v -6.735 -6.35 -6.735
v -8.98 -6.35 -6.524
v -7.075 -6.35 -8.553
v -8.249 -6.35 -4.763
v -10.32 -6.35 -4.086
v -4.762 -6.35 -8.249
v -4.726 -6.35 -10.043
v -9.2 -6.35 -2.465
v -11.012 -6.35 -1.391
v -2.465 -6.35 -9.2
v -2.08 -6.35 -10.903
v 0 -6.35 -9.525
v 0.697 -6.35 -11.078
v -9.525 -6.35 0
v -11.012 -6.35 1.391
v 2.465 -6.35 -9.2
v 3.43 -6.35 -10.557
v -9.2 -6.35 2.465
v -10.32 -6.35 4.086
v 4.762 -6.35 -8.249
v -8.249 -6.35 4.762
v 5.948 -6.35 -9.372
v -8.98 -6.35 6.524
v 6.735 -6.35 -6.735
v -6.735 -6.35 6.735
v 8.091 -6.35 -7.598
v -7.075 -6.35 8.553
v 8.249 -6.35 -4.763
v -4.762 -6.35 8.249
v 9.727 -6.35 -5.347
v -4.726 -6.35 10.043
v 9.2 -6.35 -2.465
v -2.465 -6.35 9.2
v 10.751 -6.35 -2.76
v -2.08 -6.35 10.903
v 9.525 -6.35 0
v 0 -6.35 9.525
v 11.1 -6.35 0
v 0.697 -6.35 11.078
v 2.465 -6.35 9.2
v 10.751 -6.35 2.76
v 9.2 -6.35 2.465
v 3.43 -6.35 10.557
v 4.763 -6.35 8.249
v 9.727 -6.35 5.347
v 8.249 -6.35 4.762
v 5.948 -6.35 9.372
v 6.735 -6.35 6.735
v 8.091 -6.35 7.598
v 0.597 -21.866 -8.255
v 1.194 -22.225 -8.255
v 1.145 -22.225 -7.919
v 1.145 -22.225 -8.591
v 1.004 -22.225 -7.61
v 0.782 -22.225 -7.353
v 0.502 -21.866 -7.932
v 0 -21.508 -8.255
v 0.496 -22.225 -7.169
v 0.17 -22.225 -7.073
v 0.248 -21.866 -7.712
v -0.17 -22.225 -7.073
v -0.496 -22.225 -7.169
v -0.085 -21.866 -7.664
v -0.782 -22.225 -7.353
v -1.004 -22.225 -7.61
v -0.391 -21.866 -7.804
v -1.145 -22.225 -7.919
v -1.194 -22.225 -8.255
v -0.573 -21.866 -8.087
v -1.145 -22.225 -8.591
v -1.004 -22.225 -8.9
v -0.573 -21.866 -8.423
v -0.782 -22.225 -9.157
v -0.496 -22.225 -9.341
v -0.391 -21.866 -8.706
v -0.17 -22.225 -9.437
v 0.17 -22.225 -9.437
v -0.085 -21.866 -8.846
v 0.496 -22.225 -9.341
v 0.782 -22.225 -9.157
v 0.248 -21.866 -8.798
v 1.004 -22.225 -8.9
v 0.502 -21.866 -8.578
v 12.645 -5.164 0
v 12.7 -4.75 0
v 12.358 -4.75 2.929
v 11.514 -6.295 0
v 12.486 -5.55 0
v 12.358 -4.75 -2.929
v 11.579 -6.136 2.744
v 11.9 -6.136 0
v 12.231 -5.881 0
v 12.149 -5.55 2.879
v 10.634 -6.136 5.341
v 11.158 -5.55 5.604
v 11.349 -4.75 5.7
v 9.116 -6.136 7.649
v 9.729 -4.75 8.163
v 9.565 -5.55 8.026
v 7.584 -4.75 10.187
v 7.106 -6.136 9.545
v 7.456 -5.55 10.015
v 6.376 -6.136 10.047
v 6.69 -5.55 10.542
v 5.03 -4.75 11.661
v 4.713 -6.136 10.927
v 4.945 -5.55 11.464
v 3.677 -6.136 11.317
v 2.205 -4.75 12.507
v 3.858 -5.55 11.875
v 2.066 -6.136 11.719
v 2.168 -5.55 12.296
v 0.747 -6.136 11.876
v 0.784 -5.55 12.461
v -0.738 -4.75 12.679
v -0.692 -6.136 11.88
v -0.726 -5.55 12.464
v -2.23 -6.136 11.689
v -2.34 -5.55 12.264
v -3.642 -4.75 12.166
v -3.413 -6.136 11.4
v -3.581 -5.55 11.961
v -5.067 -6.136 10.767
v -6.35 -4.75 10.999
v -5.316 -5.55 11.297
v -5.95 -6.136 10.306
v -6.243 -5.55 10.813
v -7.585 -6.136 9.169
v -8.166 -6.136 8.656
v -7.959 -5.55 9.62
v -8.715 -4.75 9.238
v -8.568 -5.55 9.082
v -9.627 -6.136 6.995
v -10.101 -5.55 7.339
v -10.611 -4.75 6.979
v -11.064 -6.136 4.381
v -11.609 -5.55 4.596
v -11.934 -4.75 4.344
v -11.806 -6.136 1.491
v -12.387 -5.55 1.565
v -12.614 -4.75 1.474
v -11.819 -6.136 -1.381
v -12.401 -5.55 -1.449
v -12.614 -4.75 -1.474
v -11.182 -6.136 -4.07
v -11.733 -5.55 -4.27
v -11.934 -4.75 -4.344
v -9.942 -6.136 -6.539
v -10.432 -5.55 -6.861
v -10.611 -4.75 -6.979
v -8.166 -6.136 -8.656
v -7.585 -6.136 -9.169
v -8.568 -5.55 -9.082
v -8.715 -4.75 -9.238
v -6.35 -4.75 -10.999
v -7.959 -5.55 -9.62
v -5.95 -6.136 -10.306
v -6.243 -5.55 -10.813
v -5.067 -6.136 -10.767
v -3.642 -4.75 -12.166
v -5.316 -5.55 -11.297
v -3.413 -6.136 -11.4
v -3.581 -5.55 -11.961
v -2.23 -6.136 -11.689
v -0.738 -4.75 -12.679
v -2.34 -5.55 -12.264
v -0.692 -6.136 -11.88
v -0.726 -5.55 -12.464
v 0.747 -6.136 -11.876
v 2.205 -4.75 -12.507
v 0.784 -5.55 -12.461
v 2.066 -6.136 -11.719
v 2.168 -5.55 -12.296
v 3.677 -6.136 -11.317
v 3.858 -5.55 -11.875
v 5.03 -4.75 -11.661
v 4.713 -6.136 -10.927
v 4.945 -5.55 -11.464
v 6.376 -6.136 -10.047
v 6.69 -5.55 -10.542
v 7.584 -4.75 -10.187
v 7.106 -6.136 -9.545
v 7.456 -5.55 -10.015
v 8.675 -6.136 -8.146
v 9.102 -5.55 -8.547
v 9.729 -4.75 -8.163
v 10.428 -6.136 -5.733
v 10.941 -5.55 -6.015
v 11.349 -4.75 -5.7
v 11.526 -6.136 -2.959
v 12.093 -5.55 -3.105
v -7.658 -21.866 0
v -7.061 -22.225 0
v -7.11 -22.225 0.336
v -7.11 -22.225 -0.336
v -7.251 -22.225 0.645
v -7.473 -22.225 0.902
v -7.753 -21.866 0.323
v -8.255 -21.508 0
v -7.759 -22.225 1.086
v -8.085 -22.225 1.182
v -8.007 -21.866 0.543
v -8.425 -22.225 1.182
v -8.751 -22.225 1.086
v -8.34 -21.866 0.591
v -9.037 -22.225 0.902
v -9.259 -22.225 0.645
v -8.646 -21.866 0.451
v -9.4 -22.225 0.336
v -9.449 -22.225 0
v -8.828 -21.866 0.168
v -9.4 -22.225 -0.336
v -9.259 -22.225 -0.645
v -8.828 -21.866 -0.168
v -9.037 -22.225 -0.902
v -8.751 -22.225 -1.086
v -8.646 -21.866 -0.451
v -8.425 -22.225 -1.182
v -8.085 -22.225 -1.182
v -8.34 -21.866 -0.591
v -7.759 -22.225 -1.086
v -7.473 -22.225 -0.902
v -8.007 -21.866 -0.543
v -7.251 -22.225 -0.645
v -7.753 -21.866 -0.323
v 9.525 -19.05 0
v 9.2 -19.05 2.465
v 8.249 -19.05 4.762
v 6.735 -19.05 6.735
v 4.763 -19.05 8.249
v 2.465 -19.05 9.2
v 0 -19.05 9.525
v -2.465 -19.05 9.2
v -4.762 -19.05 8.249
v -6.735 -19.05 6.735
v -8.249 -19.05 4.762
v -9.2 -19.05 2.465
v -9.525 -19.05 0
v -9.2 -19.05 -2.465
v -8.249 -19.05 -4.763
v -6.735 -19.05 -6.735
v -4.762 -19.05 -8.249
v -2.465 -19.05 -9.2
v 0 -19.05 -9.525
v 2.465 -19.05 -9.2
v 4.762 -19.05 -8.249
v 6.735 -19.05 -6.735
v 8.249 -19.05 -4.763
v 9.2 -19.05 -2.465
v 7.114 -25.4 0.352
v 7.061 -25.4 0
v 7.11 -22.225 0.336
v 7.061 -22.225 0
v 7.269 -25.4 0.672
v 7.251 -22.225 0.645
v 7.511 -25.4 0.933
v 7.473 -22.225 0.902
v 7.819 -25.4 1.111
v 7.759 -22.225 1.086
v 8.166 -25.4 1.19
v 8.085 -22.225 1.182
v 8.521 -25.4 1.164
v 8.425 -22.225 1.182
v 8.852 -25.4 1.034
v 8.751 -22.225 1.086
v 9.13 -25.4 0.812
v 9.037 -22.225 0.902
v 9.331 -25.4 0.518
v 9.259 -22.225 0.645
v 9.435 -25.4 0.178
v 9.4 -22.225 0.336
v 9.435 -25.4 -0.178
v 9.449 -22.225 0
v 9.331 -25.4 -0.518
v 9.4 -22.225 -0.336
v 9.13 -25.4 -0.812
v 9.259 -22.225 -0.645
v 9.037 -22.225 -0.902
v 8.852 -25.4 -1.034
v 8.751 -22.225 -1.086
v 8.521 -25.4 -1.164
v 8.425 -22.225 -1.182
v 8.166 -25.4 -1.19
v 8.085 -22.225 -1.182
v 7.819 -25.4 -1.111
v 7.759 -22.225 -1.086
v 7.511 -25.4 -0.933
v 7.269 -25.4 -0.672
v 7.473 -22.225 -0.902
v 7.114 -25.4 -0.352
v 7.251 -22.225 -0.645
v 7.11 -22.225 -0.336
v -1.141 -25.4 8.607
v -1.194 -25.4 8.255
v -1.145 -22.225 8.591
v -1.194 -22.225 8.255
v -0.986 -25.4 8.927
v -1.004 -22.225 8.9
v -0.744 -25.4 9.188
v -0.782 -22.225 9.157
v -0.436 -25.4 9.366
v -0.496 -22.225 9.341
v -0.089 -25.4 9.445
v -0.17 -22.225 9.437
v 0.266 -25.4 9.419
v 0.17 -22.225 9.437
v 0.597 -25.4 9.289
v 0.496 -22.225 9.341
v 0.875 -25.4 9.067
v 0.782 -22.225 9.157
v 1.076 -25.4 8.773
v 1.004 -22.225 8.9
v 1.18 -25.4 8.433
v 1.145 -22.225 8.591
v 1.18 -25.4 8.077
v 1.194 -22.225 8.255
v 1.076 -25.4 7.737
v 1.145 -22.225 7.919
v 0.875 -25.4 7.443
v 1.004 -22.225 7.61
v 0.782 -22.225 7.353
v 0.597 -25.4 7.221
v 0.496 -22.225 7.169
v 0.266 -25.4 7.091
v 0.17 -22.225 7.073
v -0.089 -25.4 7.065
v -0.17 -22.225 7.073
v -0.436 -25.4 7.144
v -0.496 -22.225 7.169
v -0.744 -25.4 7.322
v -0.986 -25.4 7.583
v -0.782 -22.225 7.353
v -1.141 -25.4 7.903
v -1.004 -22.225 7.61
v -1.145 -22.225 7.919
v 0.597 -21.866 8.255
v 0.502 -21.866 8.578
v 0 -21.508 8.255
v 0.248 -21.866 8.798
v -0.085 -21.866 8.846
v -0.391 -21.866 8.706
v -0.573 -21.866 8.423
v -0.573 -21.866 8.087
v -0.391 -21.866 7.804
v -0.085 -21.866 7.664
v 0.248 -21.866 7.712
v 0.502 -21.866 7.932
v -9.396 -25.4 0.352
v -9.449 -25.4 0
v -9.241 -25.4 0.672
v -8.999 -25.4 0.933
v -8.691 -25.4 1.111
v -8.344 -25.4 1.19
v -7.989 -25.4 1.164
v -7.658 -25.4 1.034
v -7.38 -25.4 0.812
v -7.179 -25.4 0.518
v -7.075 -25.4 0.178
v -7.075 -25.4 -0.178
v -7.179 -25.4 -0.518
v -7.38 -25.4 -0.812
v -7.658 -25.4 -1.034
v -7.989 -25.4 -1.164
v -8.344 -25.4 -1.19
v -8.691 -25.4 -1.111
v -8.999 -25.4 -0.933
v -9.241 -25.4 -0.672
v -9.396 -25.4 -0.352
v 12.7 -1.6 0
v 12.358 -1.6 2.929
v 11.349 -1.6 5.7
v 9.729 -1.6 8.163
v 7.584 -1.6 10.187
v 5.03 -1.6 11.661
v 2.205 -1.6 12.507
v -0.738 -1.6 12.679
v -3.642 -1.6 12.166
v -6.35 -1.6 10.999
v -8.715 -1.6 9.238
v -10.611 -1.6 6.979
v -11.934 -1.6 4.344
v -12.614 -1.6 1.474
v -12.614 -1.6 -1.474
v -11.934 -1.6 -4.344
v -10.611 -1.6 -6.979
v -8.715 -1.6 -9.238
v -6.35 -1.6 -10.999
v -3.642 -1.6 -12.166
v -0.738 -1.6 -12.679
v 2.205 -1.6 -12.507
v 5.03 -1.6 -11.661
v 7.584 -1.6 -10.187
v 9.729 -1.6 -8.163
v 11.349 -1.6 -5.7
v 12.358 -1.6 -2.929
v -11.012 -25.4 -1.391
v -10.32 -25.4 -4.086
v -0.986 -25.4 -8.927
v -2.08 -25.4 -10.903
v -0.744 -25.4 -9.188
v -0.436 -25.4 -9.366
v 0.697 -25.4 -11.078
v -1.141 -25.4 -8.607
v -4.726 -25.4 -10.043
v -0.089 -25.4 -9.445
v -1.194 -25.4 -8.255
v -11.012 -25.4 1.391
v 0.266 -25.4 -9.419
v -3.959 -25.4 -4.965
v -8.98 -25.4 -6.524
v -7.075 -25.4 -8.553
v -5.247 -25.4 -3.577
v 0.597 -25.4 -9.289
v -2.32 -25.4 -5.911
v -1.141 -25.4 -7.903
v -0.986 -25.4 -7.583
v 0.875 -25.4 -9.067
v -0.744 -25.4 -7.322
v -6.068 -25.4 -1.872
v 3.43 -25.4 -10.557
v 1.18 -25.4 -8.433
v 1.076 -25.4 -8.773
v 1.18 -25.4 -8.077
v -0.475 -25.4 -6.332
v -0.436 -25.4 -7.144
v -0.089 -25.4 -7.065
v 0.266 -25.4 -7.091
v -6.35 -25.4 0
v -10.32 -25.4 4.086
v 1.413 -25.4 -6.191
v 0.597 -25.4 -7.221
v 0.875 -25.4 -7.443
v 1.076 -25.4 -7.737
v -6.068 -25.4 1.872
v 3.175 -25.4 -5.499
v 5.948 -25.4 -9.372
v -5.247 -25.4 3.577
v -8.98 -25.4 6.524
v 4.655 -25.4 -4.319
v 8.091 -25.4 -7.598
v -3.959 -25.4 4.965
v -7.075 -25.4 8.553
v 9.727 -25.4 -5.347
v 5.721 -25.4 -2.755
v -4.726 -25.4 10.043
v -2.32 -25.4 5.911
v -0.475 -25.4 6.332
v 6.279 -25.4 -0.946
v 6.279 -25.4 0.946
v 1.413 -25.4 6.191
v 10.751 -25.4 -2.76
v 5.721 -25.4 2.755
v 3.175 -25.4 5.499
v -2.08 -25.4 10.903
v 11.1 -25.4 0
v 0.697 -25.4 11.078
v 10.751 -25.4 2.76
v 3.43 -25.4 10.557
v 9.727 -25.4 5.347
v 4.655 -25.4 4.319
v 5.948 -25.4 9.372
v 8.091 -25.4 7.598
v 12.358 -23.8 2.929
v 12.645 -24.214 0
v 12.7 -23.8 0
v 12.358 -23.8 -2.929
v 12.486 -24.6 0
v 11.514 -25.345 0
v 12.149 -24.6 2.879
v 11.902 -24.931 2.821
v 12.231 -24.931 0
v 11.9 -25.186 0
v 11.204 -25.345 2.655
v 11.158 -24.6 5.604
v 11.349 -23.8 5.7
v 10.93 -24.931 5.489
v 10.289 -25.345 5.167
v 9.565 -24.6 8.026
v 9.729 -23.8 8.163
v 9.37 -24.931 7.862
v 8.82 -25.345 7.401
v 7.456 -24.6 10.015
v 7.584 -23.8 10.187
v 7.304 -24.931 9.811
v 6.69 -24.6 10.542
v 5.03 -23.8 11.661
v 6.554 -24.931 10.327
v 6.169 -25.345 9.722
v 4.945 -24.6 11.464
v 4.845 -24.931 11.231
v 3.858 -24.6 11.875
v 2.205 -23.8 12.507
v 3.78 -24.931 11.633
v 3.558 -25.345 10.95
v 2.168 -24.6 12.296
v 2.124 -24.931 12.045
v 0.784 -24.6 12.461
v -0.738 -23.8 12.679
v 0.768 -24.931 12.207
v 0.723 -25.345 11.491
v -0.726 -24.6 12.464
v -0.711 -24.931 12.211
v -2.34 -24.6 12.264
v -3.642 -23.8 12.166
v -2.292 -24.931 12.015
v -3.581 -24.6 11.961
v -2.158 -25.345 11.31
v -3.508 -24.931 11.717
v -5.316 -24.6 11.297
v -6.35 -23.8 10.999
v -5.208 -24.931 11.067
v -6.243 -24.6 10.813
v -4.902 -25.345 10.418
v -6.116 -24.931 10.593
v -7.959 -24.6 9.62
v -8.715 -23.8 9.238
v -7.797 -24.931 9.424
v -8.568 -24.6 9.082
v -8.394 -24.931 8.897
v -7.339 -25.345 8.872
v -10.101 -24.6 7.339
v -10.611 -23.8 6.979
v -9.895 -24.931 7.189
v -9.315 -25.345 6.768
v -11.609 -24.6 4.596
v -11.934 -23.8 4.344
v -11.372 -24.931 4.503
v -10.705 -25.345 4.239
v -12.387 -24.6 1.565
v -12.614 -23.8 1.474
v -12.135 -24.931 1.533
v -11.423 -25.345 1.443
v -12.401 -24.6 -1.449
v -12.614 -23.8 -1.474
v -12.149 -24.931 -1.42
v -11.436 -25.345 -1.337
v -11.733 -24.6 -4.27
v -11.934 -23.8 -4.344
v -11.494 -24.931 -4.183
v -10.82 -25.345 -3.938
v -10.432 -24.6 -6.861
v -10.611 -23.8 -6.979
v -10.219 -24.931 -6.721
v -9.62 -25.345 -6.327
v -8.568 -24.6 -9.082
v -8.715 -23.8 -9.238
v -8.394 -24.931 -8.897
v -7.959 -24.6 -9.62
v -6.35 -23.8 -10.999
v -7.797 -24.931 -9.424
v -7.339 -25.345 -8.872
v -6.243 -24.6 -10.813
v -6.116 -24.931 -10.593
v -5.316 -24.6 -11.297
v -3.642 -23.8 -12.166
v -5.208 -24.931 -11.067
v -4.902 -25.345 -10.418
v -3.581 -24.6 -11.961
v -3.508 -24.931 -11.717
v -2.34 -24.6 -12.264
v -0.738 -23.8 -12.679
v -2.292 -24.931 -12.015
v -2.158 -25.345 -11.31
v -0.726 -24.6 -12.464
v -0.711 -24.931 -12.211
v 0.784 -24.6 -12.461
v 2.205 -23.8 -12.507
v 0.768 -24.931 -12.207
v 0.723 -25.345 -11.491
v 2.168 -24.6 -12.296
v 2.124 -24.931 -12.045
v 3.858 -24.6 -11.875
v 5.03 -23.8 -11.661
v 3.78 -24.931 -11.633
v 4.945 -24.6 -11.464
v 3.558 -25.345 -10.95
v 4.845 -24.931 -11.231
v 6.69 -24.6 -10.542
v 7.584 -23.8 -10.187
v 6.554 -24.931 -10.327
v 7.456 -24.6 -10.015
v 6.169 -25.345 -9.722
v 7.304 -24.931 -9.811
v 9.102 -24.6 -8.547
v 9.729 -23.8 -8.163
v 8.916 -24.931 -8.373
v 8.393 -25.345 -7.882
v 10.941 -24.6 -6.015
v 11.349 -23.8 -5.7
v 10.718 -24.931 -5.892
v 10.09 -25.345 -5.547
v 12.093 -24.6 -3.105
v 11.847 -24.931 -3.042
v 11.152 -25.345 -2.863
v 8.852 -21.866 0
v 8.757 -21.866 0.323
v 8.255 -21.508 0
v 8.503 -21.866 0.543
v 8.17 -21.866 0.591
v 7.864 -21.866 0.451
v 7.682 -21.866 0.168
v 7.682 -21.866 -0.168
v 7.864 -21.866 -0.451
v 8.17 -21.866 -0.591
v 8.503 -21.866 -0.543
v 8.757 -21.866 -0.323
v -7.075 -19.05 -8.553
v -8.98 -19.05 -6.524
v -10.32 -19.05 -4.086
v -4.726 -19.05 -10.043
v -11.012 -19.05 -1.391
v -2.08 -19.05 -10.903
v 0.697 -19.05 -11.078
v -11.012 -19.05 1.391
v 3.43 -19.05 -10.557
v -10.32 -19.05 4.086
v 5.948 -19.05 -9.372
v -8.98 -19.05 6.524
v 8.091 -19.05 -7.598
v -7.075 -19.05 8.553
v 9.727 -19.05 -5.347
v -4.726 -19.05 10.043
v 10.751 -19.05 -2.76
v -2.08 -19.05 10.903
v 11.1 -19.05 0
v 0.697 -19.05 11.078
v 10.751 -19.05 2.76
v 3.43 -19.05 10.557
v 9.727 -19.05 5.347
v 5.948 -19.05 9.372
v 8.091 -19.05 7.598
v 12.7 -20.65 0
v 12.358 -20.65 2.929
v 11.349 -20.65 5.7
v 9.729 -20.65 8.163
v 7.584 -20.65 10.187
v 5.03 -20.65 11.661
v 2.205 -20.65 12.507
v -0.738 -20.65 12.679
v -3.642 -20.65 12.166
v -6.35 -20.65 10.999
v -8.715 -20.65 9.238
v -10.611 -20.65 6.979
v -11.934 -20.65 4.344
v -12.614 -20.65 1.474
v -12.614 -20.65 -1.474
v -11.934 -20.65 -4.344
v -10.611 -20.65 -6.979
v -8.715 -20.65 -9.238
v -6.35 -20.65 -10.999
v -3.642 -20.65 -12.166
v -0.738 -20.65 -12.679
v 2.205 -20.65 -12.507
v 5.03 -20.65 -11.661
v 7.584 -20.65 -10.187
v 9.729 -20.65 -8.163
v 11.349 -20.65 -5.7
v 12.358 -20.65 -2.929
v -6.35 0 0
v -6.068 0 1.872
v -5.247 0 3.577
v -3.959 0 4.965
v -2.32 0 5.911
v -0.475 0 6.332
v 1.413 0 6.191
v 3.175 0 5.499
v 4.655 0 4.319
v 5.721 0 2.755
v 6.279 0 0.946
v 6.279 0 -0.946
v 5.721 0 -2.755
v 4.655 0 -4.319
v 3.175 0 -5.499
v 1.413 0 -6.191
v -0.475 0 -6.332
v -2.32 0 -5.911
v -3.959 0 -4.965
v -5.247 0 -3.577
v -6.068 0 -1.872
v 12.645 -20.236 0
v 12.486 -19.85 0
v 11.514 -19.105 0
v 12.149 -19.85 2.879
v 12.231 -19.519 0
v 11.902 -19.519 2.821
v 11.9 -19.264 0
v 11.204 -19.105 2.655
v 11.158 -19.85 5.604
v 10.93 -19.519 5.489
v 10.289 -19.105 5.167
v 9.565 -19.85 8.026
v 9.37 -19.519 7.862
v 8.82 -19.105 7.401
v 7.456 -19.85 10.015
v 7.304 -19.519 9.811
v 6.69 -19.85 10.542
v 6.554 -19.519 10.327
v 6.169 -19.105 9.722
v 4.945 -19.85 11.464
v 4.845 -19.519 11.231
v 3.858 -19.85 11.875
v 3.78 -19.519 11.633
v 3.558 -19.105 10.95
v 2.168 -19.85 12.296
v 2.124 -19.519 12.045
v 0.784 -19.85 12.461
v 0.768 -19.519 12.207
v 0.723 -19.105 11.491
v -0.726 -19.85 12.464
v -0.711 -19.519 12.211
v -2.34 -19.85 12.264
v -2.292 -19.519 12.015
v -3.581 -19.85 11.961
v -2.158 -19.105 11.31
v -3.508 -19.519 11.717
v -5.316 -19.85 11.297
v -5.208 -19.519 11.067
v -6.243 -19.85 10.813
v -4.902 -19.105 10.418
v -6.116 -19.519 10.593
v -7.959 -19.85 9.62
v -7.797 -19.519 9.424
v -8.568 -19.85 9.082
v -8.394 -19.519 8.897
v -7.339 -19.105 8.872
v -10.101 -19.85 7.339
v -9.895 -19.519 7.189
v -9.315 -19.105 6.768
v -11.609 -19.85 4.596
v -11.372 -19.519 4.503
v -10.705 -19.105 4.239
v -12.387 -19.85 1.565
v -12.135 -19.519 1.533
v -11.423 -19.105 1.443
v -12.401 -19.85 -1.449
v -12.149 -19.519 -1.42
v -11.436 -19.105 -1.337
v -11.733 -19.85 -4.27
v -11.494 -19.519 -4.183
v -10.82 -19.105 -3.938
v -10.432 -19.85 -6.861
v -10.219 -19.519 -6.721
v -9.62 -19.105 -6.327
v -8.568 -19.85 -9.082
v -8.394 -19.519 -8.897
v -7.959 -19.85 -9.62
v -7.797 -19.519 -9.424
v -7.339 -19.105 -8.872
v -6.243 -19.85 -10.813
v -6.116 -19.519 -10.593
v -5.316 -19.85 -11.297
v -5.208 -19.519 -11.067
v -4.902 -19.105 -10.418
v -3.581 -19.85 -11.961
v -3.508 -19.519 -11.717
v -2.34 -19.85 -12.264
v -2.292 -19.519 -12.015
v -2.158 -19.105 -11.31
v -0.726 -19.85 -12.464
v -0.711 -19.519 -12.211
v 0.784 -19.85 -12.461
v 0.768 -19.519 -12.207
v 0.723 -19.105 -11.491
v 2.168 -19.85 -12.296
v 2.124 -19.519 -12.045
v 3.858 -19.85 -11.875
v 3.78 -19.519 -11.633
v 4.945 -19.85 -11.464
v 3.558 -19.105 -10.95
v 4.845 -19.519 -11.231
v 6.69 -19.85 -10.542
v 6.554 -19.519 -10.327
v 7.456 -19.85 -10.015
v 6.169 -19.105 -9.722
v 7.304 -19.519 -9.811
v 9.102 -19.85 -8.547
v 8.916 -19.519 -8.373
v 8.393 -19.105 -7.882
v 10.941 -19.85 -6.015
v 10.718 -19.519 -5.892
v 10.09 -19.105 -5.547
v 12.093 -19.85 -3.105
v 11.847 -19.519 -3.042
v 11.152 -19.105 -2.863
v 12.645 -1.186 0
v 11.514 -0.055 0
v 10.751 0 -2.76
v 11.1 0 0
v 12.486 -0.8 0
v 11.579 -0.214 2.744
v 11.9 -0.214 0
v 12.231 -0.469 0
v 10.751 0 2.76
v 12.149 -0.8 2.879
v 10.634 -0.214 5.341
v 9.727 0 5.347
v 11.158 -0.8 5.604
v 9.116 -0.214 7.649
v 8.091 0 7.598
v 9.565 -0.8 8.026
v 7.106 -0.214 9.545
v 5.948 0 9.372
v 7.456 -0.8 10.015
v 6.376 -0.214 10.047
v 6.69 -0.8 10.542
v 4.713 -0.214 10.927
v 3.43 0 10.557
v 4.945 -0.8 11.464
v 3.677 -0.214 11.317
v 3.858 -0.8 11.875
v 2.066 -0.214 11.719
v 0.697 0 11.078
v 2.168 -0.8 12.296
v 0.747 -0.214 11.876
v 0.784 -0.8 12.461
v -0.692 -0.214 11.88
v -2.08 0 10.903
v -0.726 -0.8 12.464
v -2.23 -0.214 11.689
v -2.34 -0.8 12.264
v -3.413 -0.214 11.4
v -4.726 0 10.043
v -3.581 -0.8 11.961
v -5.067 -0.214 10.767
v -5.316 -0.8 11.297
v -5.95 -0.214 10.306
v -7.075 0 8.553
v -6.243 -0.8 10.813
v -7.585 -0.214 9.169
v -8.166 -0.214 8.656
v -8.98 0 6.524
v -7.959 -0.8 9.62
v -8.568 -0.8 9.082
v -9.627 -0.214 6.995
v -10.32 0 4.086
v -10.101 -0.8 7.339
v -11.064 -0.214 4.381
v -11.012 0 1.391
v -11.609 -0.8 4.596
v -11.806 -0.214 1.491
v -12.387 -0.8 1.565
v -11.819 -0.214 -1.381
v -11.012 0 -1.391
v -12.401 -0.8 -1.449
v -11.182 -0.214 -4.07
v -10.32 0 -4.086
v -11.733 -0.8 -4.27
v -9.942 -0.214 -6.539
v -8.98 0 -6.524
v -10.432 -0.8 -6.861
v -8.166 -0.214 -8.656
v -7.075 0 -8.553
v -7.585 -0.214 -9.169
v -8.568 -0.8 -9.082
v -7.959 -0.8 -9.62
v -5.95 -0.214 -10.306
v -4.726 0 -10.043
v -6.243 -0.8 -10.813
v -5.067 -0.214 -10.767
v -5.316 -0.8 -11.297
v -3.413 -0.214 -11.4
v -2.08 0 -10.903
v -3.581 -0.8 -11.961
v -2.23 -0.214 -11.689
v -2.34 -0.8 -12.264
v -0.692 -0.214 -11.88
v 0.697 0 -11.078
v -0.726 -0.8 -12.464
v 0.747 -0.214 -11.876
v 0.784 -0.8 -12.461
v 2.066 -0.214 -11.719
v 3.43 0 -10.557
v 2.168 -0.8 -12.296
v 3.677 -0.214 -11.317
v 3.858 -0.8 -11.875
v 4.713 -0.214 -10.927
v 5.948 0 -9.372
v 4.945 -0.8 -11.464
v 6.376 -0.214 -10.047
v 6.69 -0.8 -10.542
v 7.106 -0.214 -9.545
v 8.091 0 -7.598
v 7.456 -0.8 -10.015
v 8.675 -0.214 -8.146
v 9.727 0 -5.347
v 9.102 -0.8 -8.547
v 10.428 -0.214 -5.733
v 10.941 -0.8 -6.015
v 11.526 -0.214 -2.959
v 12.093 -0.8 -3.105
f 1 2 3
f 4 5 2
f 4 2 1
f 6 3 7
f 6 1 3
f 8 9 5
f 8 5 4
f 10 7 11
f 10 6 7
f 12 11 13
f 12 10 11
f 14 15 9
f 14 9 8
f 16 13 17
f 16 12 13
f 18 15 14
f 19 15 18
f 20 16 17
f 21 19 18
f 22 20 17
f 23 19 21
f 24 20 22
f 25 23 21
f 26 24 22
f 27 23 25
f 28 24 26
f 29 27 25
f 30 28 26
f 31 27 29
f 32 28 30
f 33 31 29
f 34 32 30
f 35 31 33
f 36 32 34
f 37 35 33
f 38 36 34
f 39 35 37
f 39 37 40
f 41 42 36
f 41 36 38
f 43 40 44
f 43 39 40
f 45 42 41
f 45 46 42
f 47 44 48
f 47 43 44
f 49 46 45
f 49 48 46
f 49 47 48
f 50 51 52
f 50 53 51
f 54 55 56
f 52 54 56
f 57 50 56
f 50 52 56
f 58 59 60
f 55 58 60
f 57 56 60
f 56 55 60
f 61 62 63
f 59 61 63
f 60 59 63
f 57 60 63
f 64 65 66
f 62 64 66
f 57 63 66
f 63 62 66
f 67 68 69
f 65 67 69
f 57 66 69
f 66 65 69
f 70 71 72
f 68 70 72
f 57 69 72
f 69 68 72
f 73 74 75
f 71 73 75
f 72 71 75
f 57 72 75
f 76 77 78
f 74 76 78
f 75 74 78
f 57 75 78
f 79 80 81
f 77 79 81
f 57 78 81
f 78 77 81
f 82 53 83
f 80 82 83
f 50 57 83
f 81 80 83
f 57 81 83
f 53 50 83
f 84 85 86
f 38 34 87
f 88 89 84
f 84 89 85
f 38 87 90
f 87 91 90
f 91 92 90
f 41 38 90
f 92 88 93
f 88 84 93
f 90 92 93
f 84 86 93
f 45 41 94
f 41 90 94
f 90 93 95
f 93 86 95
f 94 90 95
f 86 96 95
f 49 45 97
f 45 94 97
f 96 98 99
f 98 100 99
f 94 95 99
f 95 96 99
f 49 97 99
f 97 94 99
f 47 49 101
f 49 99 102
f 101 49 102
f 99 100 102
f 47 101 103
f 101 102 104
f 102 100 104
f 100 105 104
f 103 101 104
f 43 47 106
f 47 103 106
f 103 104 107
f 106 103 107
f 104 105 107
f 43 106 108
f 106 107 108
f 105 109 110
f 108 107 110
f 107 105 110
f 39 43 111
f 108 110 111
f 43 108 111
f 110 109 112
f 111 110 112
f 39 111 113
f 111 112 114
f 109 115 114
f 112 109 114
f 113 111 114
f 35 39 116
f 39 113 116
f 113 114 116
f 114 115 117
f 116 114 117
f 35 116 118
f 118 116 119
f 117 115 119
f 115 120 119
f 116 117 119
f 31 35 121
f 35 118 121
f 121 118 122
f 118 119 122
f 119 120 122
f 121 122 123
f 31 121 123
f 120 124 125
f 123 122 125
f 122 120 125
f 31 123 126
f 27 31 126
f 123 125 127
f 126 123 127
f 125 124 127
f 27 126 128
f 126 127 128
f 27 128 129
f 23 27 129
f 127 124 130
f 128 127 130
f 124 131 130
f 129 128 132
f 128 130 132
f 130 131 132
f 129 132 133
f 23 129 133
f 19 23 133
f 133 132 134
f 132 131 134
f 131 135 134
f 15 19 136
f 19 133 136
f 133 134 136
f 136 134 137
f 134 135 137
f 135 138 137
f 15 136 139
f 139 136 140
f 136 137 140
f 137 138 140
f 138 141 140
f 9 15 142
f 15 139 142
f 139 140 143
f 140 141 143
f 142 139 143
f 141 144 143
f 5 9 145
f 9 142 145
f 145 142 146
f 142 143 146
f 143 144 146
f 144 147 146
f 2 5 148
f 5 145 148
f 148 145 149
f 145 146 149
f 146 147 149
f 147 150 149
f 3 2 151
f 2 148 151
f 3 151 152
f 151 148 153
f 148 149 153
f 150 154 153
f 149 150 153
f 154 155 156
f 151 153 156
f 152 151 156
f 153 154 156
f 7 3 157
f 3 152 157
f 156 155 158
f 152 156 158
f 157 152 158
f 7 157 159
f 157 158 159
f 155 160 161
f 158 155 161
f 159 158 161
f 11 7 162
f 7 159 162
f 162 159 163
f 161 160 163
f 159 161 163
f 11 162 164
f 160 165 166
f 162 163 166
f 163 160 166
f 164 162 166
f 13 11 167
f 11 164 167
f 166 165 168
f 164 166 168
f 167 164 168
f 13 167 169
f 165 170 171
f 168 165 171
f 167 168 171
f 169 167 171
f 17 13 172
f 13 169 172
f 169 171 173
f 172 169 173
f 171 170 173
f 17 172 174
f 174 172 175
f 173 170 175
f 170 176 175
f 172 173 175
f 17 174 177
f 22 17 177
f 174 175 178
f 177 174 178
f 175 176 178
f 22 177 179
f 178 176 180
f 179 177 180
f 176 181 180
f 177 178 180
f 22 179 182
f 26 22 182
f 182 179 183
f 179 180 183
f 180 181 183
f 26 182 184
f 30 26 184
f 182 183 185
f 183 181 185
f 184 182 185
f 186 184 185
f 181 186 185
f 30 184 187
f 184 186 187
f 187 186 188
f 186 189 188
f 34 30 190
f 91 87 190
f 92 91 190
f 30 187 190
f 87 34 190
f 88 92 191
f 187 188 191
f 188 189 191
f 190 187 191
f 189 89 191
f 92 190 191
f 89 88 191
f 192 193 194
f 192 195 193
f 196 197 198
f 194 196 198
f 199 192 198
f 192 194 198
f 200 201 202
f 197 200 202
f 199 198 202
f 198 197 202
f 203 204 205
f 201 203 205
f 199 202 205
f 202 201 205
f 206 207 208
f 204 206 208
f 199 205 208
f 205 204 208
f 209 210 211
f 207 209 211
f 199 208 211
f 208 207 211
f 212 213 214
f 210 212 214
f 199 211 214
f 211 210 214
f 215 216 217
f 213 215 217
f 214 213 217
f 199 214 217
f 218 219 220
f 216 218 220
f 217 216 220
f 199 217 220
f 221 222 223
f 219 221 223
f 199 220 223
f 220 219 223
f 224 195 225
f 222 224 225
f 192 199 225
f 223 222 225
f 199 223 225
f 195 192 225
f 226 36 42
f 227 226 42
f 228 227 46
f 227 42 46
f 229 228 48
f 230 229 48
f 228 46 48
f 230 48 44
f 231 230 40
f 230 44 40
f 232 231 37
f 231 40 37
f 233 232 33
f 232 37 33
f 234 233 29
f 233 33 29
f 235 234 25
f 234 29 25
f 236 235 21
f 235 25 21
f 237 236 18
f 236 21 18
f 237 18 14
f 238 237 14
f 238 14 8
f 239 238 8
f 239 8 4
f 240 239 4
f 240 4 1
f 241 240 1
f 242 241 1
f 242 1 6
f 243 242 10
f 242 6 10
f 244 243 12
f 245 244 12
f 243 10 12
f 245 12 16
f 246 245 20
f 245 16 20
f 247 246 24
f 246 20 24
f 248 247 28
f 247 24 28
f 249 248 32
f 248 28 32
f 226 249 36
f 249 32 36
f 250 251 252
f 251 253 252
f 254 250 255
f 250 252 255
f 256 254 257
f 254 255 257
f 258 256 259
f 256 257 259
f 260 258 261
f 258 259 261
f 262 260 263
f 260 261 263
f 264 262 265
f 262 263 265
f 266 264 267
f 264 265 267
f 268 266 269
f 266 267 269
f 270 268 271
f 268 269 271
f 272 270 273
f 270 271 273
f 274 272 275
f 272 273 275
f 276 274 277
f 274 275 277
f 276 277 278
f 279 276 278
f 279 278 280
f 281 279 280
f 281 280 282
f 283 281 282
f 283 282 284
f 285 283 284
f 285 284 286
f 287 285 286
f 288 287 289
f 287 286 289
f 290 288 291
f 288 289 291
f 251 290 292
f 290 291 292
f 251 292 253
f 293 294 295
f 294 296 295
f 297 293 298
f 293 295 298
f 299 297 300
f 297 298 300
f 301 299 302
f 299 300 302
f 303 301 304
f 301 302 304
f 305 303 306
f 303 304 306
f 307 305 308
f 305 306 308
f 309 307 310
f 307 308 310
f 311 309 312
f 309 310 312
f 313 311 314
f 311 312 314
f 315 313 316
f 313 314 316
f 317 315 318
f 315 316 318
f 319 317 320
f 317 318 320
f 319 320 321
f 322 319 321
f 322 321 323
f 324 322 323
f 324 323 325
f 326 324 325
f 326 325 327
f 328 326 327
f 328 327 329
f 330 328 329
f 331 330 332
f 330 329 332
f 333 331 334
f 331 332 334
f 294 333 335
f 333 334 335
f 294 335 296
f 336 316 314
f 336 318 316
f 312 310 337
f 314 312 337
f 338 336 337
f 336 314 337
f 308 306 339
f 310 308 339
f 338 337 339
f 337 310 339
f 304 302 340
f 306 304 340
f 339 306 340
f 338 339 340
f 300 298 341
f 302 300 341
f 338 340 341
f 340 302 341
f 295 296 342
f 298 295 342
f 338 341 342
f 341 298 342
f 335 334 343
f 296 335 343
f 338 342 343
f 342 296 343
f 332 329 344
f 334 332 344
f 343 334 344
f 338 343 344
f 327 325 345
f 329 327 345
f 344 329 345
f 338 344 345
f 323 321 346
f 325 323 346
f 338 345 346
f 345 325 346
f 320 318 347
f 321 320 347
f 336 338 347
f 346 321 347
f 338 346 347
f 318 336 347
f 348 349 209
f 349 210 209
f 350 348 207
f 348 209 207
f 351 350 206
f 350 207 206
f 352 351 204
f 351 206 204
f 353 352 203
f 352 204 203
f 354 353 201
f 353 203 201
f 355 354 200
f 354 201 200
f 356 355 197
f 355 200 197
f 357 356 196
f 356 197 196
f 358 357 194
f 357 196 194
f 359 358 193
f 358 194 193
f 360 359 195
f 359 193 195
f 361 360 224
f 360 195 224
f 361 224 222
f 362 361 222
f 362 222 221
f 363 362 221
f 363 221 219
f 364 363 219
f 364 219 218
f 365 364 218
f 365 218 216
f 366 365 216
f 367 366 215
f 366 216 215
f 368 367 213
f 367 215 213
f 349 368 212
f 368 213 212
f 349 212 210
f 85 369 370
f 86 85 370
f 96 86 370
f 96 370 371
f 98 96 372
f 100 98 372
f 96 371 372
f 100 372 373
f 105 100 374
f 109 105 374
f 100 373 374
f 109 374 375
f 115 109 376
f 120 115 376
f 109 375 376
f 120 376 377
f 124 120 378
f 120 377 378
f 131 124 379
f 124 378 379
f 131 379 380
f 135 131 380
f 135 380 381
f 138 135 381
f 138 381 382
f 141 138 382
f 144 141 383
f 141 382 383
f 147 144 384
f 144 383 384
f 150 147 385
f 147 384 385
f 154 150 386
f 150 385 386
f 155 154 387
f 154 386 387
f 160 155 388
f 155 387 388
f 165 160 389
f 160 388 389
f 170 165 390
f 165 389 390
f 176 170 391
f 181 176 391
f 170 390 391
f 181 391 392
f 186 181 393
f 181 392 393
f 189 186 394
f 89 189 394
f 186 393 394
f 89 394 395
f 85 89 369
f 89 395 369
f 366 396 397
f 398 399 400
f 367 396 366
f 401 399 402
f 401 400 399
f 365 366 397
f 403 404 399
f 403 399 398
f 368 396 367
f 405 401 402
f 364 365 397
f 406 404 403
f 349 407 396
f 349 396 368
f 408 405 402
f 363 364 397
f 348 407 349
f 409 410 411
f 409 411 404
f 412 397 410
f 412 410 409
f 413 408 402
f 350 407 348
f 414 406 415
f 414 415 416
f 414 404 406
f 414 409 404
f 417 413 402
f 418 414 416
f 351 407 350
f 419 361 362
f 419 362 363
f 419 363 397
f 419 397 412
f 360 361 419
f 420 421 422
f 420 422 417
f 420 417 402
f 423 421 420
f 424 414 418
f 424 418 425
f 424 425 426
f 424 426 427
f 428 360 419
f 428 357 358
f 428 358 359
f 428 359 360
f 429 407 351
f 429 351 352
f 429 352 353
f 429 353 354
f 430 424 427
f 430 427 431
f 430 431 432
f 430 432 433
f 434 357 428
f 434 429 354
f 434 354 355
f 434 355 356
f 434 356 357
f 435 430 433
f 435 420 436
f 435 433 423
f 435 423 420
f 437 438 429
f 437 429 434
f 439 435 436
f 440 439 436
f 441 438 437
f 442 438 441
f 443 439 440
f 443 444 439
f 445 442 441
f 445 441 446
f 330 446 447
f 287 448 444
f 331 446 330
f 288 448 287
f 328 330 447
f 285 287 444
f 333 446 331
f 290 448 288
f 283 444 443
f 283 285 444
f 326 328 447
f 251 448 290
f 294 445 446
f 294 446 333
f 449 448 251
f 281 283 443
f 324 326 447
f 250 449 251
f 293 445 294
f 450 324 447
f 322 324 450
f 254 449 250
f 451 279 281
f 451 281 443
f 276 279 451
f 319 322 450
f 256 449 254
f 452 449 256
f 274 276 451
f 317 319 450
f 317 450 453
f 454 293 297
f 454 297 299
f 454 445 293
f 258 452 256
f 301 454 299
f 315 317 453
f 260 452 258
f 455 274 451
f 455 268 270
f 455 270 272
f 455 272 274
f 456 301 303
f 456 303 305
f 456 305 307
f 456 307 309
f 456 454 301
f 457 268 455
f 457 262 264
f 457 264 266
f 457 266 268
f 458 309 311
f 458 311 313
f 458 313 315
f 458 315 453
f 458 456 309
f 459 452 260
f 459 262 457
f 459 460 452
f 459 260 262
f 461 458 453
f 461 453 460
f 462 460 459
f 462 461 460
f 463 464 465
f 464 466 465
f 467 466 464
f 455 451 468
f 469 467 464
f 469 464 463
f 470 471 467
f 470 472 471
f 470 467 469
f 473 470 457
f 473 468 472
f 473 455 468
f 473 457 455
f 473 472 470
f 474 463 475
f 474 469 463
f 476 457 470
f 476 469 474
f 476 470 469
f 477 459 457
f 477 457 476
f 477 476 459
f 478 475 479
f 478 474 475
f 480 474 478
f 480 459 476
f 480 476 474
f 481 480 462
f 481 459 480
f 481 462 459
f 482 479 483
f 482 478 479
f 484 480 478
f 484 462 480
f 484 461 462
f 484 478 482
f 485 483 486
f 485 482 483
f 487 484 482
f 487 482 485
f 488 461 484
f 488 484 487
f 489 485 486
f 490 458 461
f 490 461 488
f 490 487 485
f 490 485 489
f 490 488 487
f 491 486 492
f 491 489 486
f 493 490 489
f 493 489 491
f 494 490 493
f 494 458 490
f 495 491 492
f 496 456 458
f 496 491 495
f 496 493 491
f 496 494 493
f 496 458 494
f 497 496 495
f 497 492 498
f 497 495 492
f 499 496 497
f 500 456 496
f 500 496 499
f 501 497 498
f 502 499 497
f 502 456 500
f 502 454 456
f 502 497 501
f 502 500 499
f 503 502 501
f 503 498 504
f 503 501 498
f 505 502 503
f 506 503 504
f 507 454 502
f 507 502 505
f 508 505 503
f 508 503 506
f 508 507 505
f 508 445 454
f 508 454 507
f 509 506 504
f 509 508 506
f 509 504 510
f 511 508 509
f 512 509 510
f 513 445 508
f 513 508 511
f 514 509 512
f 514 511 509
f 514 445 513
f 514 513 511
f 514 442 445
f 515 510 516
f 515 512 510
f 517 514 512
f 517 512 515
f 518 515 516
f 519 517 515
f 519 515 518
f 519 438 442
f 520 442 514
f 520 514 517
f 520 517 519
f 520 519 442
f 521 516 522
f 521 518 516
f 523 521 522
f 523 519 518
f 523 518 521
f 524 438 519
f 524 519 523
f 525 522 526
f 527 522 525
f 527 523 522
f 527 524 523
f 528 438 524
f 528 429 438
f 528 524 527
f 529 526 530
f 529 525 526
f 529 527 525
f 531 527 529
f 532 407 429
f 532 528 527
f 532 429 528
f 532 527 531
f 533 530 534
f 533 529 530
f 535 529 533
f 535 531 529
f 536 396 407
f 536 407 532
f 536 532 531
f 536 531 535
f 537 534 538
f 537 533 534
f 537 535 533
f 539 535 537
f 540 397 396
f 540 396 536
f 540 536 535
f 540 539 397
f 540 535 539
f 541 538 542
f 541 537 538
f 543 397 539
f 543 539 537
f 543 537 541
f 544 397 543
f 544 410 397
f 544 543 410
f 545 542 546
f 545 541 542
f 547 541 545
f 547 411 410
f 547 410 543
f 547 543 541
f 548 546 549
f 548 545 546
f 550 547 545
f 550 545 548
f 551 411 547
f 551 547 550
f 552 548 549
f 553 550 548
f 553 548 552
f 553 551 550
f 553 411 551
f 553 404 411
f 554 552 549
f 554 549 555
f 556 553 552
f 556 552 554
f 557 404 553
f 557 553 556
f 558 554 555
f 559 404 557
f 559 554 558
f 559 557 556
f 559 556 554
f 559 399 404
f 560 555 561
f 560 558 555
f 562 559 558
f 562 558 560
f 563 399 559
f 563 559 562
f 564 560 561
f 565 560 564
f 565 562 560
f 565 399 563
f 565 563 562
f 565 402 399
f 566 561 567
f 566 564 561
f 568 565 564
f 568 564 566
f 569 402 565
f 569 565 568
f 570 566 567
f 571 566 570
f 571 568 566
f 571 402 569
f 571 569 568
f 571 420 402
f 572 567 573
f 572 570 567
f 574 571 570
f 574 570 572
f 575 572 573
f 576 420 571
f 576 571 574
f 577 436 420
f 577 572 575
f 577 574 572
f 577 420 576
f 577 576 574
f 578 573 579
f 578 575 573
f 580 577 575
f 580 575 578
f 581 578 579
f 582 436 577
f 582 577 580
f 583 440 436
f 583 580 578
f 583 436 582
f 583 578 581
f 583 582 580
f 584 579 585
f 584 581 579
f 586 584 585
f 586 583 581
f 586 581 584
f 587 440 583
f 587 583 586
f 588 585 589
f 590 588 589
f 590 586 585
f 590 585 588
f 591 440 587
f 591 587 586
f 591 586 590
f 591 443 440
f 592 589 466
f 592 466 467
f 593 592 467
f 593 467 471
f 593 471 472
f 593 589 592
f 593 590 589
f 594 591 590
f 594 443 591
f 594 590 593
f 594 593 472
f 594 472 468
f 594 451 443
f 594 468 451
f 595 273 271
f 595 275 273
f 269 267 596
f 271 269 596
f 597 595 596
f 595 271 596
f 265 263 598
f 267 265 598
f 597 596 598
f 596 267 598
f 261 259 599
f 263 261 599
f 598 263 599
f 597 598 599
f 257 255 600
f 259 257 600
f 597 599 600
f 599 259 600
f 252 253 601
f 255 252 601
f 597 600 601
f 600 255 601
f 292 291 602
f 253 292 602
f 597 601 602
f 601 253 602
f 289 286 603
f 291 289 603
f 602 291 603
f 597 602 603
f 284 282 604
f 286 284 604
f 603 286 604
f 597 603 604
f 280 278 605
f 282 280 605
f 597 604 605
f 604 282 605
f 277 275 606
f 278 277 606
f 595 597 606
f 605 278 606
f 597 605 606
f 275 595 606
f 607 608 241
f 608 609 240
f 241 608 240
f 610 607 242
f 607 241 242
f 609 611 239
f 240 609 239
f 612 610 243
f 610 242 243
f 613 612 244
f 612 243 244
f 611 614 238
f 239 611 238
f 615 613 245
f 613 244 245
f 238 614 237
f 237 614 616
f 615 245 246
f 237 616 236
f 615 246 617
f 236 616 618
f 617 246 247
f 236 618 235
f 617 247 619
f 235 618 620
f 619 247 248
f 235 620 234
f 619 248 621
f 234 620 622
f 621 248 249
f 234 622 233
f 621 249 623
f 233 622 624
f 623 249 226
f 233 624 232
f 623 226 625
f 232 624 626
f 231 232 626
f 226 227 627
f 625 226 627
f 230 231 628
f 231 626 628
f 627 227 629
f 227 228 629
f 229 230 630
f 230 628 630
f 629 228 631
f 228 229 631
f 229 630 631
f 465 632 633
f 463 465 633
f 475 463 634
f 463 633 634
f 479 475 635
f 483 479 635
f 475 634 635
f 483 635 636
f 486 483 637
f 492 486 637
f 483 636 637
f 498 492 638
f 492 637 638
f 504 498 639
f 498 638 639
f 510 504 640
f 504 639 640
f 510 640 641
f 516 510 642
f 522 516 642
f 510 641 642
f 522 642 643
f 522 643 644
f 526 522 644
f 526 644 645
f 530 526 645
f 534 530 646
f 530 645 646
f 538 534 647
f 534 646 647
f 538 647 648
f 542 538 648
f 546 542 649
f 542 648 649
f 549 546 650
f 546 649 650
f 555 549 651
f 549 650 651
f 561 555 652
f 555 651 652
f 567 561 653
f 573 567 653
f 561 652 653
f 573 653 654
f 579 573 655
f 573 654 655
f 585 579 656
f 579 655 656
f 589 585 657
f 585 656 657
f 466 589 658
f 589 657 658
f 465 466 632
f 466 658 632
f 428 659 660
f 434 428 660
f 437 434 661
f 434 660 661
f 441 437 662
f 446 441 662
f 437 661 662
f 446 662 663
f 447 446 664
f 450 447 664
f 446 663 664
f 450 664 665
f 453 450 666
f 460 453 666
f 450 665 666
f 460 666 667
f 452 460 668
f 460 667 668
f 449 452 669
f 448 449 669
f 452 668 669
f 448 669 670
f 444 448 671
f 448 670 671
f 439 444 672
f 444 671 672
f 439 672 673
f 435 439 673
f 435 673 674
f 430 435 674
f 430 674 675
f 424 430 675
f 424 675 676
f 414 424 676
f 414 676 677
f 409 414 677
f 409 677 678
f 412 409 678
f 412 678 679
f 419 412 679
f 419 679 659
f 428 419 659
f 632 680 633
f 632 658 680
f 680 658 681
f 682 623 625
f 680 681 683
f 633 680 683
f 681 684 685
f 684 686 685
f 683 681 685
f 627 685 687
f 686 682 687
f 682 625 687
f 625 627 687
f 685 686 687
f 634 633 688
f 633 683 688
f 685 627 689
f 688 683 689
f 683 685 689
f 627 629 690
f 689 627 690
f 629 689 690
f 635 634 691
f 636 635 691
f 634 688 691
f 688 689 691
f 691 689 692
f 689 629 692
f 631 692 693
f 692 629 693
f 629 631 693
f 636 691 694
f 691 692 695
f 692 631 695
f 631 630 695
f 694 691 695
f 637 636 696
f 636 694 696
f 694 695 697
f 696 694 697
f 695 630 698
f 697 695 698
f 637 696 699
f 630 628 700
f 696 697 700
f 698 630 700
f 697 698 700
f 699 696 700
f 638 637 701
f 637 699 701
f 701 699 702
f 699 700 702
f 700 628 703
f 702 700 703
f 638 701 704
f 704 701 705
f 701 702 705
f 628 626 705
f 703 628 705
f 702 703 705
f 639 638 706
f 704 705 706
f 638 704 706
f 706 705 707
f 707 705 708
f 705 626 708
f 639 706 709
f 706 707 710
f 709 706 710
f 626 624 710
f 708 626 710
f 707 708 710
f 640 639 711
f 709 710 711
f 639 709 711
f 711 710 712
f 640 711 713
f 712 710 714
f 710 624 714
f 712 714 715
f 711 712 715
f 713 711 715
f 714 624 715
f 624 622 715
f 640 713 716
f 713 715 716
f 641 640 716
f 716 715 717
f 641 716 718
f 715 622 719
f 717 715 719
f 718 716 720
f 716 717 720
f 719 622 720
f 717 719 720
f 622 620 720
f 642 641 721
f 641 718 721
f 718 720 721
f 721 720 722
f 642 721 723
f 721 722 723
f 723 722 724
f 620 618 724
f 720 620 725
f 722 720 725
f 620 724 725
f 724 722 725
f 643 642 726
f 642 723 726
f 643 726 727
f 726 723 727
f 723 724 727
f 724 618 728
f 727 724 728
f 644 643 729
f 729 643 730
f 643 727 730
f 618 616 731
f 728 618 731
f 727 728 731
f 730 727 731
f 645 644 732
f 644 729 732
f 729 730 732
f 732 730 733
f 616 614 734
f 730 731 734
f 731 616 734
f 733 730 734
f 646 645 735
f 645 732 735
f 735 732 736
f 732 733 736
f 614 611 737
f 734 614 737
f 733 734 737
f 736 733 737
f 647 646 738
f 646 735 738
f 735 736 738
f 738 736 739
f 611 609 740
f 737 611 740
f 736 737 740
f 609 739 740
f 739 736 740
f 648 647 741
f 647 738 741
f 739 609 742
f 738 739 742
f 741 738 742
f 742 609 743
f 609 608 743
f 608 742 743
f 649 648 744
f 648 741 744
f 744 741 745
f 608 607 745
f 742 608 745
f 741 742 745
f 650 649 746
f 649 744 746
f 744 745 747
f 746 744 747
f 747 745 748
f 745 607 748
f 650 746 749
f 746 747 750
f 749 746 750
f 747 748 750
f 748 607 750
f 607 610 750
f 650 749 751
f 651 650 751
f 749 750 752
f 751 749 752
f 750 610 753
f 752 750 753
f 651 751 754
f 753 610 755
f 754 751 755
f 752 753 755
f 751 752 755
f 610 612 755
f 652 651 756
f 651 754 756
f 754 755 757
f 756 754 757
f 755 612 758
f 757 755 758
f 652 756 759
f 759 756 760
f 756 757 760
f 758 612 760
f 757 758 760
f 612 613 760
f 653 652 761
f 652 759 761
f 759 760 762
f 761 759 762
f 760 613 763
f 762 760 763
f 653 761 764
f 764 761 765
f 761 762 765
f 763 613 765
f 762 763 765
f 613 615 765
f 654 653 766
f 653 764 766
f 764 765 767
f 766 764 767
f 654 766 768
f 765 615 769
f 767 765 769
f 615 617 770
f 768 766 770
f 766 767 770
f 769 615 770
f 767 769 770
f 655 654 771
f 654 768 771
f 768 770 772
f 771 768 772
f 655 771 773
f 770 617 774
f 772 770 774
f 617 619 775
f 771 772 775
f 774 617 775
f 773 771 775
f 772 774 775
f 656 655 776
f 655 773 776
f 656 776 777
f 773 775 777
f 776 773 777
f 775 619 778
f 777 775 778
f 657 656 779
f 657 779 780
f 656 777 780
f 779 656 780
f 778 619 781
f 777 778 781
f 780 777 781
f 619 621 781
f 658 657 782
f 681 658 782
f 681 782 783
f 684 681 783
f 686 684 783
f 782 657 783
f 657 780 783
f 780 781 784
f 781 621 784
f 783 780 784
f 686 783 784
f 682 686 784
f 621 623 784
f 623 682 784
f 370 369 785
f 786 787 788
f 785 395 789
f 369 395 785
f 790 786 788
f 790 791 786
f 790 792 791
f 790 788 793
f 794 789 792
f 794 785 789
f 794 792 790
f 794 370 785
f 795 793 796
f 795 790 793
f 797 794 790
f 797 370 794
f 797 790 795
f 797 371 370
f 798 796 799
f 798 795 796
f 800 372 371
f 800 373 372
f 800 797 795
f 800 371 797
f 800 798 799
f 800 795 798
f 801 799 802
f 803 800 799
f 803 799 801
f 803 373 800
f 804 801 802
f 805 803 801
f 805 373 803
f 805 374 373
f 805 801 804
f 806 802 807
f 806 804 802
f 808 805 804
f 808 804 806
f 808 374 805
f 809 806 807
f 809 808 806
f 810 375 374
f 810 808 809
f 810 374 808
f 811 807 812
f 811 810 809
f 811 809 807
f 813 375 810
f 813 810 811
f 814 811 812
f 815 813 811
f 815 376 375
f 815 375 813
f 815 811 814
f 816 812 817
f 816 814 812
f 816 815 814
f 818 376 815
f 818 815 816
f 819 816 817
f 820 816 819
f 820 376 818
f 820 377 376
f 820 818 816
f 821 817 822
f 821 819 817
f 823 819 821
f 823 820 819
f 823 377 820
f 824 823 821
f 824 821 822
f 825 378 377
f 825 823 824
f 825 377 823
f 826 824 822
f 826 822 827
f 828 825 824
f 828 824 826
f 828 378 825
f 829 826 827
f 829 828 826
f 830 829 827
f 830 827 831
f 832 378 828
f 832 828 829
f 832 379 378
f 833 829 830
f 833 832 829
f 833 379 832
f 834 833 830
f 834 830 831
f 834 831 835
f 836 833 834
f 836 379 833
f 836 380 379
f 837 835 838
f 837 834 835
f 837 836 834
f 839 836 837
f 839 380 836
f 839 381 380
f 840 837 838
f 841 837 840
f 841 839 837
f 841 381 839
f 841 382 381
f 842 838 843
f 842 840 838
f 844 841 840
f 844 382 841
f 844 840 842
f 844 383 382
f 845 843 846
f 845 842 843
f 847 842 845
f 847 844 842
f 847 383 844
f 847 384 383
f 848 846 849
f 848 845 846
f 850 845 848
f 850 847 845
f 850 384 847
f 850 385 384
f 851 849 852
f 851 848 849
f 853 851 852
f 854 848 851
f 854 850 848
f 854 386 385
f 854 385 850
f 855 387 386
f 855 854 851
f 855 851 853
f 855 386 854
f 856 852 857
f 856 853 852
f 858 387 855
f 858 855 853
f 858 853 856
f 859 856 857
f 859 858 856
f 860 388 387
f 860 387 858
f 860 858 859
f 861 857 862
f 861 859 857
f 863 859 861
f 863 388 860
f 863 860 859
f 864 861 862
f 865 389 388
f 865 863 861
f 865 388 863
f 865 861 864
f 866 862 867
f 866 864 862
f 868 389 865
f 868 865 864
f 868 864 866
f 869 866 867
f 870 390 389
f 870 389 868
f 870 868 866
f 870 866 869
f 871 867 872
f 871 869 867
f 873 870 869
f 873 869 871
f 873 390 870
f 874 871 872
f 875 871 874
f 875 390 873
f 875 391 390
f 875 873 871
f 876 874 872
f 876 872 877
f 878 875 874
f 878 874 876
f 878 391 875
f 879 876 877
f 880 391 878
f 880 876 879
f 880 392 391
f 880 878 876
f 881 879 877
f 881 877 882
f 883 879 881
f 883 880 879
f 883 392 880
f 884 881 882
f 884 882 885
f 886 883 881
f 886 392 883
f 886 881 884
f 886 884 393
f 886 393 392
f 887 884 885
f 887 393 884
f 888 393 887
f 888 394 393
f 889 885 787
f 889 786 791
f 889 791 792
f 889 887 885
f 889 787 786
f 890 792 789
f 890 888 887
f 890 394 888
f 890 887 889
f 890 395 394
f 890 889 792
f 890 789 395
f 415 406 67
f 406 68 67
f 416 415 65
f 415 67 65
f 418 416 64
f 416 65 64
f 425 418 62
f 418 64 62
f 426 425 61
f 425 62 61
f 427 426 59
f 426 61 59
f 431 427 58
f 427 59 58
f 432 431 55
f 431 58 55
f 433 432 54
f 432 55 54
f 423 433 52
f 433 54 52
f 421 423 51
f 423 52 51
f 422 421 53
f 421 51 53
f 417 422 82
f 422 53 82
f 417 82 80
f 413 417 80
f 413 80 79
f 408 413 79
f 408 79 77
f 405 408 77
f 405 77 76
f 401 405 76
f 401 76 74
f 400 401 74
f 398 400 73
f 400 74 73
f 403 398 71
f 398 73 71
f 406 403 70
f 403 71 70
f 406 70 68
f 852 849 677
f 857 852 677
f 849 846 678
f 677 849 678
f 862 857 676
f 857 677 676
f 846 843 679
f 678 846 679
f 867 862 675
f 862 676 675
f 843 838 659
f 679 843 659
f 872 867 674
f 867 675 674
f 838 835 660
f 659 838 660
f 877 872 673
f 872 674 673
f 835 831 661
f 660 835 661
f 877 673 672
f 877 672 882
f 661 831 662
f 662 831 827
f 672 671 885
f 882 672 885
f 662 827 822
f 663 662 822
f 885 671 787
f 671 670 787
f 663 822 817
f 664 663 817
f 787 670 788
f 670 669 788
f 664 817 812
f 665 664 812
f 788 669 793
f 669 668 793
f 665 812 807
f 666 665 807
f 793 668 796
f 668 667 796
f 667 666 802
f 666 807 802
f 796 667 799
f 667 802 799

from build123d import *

# Parameters (mm, degrees)
F0_R     = 12.7
F1_DEPTH = 6.35
F2_R     = 9.525
F3_DEPTH = 12.7
F4_R     = 12.7
F5_DEPTH = 6.35
F7_D     = 12.7
F9_D     = 2.3876
F9_DEPTH = 3.175
F9_TIP   = 0.717307407
F10_R    = 1.6002


with BuildPart() as f1:
    # F0 (on Front) → F1 (new body)
    with BuildSketch(Plane.XZ):
        Circle(F0_R)
    extrude(amount=F1_DEPTH)

    # F2 (on face) → F3 (join)
    with BuildSketch(Plane.XZ.offset(6.35)):
        Circle(F2_R)
    extrude(amount=F3_DEPTH)

    # F4 (on face) → F5 (join)
    with BuildSketch(Plane.XZ.offset(19.05)):
        Circle(F4_R)
    extrude(amount=F5_DEPTH)

    # F7 (through all)
    with Locations(Plane.XZ.offset(25.4)):
        with Locations((0, 0)):
            Hole(F7_D / 2)

    # F9
    with Locations(Plane.XZ.offset(25.4)):
        with Locations((0, 8.255), (8.255, 0), (0, -8.255), (-8.255, 0)):
            Hole(F9_D / 2, depth=F9_DEPTH)
            with Locations((0, 0, -(F9_DEPTH + F9_TIP / 2))):  # 118° drill point
                Cone(0, F9_D / 2, F9_TIP, mode=Mode.SUBTRACT)

    # F10
    f10_edges = [f1.edges().sort_by_distance(p)[0] for p in [
        (-12.7, 0, 0),
        (-12.7, -19.05, 0),
        (-12.7, -25.4, 0),
        (-12.7, -6.35, 0),
    ]]
    fillet(f10_edges, radius=F10_R)


solid = f1.part
